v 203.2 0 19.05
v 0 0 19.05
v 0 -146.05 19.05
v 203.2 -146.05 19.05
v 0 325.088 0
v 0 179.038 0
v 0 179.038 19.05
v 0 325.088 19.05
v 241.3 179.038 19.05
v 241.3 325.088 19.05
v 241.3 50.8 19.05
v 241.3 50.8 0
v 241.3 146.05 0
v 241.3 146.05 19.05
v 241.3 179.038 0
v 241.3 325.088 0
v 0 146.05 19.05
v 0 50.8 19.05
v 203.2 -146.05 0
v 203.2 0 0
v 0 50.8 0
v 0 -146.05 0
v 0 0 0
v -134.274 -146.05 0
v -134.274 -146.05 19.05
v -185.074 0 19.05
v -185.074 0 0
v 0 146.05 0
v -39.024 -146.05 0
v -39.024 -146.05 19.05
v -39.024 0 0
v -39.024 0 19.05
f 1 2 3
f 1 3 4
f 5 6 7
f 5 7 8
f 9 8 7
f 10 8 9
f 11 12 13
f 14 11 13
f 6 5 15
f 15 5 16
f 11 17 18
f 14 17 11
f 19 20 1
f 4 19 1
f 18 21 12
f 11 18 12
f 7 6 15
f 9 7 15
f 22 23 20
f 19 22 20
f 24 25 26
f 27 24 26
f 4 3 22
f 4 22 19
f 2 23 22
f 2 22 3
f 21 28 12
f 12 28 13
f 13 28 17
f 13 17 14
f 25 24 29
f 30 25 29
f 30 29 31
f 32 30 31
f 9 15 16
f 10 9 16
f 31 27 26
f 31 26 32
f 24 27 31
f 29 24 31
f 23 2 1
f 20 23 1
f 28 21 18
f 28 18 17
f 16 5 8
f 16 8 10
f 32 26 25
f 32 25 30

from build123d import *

# Parameters (mm, degrees)
F0_W     = 203.2
F0_H     = 19.05
F1_DEPTH = 146.05
F2_W     = 241.3
F2_H     = 95.25
F3_DEPTH = 19.05
F4_W     = 241.3
F4_H     = 146.05
F5_DEPTH = 19.05
F6_W     = 146.05
F6_H     = 146.05
F7_DEPTH = 19.05
F9_DEPTH = 19.051


with BuildPart() as f1:
    # F0 (on Front) → F1 (new body)
    with BuildSketch(Plane.XZ):
        with Locations((101.6, 9.525)):
            Rectangle(F0_W, F0_H)
    extrude(amount=F1_DEPTH)


with BuildPart() as f3:
    # F2 (on Top) → F3 (new body)
    with BuildSketch(Plane.XY):
        with Locations((120.65, 98.425)):
            Rectangle(F2_W, F2_H)
    extrude(amount=F3_DEPTH)


with BuildPart() as f5:
    # F4 (on Top) → F5 (new body)
    with BuildSketch(Plane.XY):
        with Locations((120.65, 252.063066)):
            Rectangle(F4_W, F4_H)
    extrude(amount=F5_DEPTH)


with BuildPart() as f7:
    # F6 (on Top) → F7 (new body)
    with BuildSketch(Plane.XY):
        with Locations((-112.048805, -73.025)):
            Rectangle(F6_W, F6_H)
    extrude(amount=F7_DEPTH)

    # F8 (on face) → F9 (cut, through all)
    with BuildSketch(Plane.XY.offset(19.05)):
        Polygon((-134.273805, -146.05), (-185.073805, 0), (-185.073805, -146.05), align=None)
    extrude(amount=-F9_DEPTH, mode=Mode.SUBTRACT)


solid = Compound([f1.part, f3.part, f5.part, f7.part])
